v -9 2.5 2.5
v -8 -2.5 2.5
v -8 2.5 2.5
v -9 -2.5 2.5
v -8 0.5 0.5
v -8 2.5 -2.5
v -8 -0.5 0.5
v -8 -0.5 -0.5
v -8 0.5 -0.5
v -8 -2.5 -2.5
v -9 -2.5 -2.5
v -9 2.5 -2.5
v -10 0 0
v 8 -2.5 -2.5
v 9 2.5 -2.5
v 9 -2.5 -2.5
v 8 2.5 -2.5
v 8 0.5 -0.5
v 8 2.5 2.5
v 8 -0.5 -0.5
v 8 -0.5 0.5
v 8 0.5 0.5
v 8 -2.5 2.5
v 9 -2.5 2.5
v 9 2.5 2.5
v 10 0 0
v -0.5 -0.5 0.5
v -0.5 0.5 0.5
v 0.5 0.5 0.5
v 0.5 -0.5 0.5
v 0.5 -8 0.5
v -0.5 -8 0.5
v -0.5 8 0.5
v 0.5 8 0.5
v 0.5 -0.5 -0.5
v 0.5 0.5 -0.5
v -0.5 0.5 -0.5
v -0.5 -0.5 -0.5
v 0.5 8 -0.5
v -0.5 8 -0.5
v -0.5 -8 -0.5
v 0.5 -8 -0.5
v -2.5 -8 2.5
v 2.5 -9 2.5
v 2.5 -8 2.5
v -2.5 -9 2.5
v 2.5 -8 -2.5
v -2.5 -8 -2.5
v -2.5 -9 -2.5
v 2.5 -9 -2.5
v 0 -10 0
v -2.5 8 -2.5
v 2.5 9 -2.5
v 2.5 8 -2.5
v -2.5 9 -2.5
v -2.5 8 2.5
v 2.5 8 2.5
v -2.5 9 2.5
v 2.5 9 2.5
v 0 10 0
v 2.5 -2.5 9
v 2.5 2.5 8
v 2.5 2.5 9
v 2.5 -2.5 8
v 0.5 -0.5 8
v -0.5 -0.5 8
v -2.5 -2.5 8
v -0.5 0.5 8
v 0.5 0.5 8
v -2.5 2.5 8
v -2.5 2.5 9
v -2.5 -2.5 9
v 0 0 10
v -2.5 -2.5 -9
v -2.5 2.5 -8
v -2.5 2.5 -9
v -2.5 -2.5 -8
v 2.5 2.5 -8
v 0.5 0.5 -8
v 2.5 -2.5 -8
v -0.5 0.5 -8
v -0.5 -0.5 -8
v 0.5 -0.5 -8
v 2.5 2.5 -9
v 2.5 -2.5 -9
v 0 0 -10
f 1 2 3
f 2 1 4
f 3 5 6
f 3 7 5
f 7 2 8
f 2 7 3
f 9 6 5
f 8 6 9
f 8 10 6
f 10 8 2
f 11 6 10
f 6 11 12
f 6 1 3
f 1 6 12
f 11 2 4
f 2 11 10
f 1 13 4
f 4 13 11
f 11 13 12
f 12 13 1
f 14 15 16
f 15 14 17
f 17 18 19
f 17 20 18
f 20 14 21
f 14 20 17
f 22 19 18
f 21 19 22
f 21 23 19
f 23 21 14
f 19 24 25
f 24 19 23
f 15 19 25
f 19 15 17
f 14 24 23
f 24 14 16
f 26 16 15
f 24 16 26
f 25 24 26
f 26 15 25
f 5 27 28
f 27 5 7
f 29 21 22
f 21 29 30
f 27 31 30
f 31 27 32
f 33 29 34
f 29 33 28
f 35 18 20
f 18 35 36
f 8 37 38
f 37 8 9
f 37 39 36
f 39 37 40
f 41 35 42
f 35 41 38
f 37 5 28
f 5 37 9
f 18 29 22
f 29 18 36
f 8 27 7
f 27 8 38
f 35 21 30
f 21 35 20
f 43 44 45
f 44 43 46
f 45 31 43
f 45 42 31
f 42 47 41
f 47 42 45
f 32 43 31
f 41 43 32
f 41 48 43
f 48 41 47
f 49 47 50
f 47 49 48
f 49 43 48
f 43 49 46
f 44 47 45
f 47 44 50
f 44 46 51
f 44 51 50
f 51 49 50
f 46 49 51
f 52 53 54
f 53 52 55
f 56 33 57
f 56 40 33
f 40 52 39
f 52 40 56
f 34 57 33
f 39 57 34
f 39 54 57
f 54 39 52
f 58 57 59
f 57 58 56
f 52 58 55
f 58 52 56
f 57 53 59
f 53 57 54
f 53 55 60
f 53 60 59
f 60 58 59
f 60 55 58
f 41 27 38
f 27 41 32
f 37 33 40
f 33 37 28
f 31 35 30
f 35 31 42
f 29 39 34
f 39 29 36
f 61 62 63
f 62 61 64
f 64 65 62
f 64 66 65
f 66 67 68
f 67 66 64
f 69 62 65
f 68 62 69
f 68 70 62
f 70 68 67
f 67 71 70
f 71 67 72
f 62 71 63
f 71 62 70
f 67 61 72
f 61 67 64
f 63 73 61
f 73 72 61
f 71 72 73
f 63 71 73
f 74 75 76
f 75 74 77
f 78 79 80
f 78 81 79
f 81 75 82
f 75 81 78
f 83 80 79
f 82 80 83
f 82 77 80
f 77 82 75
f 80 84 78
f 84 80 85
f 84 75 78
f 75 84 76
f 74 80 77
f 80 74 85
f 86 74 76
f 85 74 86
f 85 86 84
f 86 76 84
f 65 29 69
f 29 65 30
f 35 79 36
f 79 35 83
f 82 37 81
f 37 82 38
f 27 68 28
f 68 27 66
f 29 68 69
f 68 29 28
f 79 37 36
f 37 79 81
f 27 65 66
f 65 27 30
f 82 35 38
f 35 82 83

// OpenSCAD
// file: TranslationFace.scad
//=============================================================================
// One of these is used for each face of the TranslationManip in MakerVR.
//=============================================================================

module Pyramid(baseSize = 10, height = 10) {
     bsh = baseSize / 2;
     points = [
          // Base.
          [ bsh,  bsh, 0],
          [ bsh, -bsh, 0],
          [-bsh, -bsh, 0],
          [-bsh,  bsh, 0],
          // Pointy top.
          [0, 0, height]
     ];
     faces = [
          // Sides.
          [0, 4, 1], [1, 4, 2], [2, 4, 3], [3, 4, 0],
          // Base
          [1, 3, 0], [2, 3, 1]
     ];

     polyhedron(points = points, faces = faces);
}

module TranslationFace() {
     translate([0, 0, 1]) cube([10, 10, 2], center = true);
     translate([0, 0, 2]) Pyramid(baseSize = 10, height = 2);
}

TranslationFace();
// main file
use <TranslationFace.scad>

module TranslationToolIcon() {
  module Axis_() {
    kL = 8;
    kS = .5;
    cube([2 * kL, 1, 1], center = true);
    translate([-kL, 0, 0]) rotate([0, -90, 0]) scale(kS) TranslationFace();
    translate([ kL, 0, 0]) rotate([0,  90, 0]) scale(kS) TranslationFace();
  }

  Axis_();
  rotate([0, 0, 90]) Axis_();
  rotate([0, 90, 0]) Axis_();
}

TranslationToolIcon($fn = 72);
